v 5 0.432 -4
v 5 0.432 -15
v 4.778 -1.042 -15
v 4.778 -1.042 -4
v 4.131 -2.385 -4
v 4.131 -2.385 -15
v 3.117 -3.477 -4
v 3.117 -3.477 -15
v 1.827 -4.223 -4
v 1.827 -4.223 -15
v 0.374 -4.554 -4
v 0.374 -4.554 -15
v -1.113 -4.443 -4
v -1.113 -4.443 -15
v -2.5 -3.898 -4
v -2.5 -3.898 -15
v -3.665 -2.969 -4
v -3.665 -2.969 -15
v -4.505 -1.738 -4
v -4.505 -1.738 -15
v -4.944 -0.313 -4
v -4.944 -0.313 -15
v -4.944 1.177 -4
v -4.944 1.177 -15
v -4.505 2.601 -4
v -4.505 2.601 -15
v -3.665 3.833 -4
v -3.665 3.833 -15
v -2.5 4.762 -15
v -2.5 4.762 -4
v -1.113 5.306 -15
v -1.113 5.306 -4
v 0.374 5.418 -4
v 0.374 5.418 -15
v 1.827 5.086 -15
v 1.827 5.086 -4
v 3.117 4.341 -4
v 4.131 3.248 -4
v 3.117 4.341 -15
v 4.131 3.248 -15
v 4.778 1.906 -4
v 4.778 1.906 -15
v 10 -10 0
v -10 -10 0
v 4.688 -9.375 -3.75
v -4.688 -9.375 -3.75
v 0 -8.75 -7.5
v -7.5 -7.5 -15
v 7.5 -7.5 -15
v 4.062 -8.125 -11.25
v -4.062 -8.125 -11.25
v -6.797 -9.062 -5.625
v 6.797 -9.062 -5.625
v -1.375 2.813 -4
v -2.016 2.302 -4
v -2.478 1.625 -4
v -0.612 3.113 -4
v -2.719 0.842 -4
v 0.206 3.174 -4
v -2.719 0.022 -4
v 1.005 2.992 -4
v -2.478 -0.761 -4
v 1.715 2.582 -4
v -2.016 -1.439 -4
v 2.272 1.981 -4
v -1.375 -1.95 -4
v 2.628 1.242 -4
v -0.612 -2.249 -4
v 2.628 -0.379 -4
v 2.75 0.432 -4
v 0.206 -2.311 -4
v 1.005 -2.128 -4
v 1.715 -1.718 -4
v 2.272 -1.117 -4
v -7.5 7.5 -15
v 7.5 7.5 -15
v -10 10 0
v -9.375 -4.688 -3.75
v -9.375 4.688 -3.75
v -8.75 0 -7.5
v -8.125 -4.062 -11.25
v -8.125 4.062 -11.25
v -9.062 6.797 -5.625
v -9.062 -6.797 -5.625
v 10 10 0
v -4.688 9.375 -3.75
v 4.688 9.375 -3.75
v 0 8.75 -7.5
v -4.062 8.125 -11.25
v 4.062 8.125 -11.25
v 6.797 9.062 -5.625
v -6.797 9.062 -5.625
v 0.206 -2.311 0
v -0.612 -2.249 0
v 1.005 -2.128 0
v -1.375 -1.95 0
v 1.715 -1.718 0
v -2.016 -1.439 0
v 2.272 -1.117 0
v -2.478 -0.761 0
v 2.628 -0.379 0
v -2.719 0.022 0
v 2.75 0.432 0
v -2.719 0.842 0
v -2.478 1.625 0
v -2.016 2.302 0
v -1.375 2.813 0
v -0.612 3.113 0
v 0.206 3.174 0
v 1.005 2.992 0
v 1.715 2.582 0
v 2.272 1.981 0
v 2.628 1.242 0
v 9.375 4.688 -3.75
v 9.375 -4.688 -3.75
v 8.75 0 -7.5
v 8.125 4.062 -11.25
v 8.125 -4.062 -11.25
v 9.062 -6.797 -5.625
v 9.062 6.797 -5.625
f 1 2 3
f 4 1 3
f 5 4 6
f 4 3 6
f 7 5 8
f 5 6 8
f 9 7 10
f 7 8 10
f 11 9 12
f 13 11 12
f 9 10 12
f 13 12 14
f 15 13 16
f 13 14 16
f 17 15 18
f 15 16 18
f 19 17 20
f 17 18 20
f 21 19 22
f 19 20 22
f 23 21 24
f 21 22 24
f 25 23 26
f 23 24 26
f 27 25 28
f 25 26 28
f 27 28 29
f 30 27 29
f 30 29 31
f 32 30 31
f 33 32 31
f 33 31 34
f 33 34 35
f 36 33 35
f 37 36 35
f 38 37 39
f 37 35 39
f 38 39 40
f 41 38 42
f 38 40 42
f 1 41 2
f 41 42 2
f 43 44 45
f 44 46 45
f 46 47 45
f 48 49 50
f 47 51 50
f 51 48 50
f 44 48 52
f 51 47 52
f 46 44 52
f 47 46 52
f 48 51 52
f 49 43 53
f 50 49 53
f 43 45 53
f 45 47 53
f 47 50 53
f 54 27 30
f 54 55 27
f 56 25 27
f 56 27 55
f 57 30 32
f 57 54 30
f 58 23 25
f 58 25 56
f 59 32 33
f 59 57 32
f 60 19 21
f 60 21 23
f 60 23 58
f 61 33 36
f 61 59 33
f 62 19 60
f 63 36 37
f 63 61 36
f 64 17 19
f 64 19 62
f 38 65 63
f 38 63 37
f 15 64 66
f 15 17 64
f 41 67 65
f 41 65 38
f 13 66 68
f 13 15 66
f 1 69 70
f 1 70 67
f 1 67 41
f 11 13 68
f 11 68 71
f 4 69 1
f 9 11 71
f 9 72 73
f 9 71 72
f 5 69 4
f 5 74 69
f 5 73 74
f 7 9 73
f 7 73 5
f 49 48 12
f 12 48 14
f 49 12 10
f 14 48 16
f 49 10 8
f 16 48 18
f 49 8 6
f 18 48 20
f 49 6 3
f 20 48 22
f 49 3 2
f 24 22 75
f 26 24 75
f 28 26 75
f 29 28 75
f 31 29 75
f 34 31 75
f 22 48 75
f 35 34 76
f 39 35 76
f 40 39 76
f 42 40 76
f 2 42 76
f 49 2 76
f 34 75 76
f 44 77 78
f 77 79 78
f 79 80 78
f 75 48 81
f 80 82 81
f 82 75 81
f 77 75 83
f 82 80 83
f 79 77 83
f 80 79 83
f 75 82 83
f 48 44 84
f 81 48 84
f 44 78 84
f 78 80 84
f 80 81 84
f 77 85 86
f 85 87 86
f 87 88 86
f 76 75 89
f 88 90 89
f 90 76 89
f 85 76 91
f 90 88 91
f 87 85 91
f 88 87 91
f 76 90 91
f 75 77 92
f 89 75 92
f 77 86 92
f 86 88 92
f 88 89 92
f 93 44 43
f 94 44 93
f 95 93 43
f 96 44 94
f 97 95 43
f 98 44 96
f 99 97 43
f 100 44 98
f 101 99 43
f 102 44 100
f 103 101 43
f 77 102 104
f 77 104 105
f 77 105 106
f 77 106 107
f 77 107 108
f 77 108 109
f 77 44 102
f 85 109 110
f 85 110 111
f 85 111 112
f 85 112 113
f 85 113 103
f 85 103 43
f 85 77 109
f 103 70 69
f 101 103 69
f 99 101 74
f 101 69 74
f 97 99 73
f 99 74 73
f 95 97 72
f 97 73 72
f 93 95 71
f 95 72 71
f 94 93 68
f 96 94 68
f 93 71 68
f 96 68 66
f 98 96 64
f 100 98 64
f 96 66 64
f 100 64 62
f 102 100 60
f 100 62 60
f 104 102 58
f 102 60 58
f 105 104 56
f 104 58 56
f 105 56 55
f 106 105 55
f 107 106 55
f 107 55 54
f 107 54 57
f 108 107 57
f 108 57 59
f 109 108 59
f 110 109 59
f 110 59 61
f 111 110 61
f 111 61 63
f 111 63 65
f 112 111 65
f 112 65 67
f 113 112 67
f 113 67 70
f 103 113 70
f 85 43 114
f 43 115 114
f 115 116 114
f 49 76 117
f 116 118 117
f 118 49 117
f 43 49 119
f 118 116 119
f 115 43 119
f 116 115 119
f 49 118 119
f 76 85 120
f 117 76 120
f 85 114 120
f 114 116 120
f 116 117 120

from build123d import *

# Parameters (mm, degrees)
F0_W     = 20
F0_H     = 20
F2_W     = 15
F2_H     = 15
F4_R     = 5
F5_DEPTH = 11
F6_R     = 2.75
F7_DEPTH = 10


with BuildPart() as f3:
    # F0 (on Top) → F3 section 0
    with BuildSketch(Plane.XY):
        Rectangle(F0_W, F0_H)
    # F2 (on offset) → F3 section 1
    with BuildSketch(Plane.XY.offset(-15)):
        Rectangle(F2_W, F2_H)
    loft()

    # F4 (on face) → F5 (cut)
    with BuildSketch(Plane(origin=(0, 0, -15), x_dir=(1, 0, 0), z_dir=(0, 0, -1))):
        with Locations((0, -0.431754)):
            Circle(F4_R)
    extrude(amount=-F5_DEPTH, mode=Mode.SUBTRACT)

    # F6 (on face) → F7 (cut)
    with BuildSketch(Plane(origin=(0, 0, -4), x_dir=(1, 0, 0), z_dir=(0, 0, -1))):
        with Locations((0, -0.431754)):
            Circle(F6_R)
    extrude(amount=-F7_DEPTH, mode=Mode.SUBTRACT)


solid = f3.part
